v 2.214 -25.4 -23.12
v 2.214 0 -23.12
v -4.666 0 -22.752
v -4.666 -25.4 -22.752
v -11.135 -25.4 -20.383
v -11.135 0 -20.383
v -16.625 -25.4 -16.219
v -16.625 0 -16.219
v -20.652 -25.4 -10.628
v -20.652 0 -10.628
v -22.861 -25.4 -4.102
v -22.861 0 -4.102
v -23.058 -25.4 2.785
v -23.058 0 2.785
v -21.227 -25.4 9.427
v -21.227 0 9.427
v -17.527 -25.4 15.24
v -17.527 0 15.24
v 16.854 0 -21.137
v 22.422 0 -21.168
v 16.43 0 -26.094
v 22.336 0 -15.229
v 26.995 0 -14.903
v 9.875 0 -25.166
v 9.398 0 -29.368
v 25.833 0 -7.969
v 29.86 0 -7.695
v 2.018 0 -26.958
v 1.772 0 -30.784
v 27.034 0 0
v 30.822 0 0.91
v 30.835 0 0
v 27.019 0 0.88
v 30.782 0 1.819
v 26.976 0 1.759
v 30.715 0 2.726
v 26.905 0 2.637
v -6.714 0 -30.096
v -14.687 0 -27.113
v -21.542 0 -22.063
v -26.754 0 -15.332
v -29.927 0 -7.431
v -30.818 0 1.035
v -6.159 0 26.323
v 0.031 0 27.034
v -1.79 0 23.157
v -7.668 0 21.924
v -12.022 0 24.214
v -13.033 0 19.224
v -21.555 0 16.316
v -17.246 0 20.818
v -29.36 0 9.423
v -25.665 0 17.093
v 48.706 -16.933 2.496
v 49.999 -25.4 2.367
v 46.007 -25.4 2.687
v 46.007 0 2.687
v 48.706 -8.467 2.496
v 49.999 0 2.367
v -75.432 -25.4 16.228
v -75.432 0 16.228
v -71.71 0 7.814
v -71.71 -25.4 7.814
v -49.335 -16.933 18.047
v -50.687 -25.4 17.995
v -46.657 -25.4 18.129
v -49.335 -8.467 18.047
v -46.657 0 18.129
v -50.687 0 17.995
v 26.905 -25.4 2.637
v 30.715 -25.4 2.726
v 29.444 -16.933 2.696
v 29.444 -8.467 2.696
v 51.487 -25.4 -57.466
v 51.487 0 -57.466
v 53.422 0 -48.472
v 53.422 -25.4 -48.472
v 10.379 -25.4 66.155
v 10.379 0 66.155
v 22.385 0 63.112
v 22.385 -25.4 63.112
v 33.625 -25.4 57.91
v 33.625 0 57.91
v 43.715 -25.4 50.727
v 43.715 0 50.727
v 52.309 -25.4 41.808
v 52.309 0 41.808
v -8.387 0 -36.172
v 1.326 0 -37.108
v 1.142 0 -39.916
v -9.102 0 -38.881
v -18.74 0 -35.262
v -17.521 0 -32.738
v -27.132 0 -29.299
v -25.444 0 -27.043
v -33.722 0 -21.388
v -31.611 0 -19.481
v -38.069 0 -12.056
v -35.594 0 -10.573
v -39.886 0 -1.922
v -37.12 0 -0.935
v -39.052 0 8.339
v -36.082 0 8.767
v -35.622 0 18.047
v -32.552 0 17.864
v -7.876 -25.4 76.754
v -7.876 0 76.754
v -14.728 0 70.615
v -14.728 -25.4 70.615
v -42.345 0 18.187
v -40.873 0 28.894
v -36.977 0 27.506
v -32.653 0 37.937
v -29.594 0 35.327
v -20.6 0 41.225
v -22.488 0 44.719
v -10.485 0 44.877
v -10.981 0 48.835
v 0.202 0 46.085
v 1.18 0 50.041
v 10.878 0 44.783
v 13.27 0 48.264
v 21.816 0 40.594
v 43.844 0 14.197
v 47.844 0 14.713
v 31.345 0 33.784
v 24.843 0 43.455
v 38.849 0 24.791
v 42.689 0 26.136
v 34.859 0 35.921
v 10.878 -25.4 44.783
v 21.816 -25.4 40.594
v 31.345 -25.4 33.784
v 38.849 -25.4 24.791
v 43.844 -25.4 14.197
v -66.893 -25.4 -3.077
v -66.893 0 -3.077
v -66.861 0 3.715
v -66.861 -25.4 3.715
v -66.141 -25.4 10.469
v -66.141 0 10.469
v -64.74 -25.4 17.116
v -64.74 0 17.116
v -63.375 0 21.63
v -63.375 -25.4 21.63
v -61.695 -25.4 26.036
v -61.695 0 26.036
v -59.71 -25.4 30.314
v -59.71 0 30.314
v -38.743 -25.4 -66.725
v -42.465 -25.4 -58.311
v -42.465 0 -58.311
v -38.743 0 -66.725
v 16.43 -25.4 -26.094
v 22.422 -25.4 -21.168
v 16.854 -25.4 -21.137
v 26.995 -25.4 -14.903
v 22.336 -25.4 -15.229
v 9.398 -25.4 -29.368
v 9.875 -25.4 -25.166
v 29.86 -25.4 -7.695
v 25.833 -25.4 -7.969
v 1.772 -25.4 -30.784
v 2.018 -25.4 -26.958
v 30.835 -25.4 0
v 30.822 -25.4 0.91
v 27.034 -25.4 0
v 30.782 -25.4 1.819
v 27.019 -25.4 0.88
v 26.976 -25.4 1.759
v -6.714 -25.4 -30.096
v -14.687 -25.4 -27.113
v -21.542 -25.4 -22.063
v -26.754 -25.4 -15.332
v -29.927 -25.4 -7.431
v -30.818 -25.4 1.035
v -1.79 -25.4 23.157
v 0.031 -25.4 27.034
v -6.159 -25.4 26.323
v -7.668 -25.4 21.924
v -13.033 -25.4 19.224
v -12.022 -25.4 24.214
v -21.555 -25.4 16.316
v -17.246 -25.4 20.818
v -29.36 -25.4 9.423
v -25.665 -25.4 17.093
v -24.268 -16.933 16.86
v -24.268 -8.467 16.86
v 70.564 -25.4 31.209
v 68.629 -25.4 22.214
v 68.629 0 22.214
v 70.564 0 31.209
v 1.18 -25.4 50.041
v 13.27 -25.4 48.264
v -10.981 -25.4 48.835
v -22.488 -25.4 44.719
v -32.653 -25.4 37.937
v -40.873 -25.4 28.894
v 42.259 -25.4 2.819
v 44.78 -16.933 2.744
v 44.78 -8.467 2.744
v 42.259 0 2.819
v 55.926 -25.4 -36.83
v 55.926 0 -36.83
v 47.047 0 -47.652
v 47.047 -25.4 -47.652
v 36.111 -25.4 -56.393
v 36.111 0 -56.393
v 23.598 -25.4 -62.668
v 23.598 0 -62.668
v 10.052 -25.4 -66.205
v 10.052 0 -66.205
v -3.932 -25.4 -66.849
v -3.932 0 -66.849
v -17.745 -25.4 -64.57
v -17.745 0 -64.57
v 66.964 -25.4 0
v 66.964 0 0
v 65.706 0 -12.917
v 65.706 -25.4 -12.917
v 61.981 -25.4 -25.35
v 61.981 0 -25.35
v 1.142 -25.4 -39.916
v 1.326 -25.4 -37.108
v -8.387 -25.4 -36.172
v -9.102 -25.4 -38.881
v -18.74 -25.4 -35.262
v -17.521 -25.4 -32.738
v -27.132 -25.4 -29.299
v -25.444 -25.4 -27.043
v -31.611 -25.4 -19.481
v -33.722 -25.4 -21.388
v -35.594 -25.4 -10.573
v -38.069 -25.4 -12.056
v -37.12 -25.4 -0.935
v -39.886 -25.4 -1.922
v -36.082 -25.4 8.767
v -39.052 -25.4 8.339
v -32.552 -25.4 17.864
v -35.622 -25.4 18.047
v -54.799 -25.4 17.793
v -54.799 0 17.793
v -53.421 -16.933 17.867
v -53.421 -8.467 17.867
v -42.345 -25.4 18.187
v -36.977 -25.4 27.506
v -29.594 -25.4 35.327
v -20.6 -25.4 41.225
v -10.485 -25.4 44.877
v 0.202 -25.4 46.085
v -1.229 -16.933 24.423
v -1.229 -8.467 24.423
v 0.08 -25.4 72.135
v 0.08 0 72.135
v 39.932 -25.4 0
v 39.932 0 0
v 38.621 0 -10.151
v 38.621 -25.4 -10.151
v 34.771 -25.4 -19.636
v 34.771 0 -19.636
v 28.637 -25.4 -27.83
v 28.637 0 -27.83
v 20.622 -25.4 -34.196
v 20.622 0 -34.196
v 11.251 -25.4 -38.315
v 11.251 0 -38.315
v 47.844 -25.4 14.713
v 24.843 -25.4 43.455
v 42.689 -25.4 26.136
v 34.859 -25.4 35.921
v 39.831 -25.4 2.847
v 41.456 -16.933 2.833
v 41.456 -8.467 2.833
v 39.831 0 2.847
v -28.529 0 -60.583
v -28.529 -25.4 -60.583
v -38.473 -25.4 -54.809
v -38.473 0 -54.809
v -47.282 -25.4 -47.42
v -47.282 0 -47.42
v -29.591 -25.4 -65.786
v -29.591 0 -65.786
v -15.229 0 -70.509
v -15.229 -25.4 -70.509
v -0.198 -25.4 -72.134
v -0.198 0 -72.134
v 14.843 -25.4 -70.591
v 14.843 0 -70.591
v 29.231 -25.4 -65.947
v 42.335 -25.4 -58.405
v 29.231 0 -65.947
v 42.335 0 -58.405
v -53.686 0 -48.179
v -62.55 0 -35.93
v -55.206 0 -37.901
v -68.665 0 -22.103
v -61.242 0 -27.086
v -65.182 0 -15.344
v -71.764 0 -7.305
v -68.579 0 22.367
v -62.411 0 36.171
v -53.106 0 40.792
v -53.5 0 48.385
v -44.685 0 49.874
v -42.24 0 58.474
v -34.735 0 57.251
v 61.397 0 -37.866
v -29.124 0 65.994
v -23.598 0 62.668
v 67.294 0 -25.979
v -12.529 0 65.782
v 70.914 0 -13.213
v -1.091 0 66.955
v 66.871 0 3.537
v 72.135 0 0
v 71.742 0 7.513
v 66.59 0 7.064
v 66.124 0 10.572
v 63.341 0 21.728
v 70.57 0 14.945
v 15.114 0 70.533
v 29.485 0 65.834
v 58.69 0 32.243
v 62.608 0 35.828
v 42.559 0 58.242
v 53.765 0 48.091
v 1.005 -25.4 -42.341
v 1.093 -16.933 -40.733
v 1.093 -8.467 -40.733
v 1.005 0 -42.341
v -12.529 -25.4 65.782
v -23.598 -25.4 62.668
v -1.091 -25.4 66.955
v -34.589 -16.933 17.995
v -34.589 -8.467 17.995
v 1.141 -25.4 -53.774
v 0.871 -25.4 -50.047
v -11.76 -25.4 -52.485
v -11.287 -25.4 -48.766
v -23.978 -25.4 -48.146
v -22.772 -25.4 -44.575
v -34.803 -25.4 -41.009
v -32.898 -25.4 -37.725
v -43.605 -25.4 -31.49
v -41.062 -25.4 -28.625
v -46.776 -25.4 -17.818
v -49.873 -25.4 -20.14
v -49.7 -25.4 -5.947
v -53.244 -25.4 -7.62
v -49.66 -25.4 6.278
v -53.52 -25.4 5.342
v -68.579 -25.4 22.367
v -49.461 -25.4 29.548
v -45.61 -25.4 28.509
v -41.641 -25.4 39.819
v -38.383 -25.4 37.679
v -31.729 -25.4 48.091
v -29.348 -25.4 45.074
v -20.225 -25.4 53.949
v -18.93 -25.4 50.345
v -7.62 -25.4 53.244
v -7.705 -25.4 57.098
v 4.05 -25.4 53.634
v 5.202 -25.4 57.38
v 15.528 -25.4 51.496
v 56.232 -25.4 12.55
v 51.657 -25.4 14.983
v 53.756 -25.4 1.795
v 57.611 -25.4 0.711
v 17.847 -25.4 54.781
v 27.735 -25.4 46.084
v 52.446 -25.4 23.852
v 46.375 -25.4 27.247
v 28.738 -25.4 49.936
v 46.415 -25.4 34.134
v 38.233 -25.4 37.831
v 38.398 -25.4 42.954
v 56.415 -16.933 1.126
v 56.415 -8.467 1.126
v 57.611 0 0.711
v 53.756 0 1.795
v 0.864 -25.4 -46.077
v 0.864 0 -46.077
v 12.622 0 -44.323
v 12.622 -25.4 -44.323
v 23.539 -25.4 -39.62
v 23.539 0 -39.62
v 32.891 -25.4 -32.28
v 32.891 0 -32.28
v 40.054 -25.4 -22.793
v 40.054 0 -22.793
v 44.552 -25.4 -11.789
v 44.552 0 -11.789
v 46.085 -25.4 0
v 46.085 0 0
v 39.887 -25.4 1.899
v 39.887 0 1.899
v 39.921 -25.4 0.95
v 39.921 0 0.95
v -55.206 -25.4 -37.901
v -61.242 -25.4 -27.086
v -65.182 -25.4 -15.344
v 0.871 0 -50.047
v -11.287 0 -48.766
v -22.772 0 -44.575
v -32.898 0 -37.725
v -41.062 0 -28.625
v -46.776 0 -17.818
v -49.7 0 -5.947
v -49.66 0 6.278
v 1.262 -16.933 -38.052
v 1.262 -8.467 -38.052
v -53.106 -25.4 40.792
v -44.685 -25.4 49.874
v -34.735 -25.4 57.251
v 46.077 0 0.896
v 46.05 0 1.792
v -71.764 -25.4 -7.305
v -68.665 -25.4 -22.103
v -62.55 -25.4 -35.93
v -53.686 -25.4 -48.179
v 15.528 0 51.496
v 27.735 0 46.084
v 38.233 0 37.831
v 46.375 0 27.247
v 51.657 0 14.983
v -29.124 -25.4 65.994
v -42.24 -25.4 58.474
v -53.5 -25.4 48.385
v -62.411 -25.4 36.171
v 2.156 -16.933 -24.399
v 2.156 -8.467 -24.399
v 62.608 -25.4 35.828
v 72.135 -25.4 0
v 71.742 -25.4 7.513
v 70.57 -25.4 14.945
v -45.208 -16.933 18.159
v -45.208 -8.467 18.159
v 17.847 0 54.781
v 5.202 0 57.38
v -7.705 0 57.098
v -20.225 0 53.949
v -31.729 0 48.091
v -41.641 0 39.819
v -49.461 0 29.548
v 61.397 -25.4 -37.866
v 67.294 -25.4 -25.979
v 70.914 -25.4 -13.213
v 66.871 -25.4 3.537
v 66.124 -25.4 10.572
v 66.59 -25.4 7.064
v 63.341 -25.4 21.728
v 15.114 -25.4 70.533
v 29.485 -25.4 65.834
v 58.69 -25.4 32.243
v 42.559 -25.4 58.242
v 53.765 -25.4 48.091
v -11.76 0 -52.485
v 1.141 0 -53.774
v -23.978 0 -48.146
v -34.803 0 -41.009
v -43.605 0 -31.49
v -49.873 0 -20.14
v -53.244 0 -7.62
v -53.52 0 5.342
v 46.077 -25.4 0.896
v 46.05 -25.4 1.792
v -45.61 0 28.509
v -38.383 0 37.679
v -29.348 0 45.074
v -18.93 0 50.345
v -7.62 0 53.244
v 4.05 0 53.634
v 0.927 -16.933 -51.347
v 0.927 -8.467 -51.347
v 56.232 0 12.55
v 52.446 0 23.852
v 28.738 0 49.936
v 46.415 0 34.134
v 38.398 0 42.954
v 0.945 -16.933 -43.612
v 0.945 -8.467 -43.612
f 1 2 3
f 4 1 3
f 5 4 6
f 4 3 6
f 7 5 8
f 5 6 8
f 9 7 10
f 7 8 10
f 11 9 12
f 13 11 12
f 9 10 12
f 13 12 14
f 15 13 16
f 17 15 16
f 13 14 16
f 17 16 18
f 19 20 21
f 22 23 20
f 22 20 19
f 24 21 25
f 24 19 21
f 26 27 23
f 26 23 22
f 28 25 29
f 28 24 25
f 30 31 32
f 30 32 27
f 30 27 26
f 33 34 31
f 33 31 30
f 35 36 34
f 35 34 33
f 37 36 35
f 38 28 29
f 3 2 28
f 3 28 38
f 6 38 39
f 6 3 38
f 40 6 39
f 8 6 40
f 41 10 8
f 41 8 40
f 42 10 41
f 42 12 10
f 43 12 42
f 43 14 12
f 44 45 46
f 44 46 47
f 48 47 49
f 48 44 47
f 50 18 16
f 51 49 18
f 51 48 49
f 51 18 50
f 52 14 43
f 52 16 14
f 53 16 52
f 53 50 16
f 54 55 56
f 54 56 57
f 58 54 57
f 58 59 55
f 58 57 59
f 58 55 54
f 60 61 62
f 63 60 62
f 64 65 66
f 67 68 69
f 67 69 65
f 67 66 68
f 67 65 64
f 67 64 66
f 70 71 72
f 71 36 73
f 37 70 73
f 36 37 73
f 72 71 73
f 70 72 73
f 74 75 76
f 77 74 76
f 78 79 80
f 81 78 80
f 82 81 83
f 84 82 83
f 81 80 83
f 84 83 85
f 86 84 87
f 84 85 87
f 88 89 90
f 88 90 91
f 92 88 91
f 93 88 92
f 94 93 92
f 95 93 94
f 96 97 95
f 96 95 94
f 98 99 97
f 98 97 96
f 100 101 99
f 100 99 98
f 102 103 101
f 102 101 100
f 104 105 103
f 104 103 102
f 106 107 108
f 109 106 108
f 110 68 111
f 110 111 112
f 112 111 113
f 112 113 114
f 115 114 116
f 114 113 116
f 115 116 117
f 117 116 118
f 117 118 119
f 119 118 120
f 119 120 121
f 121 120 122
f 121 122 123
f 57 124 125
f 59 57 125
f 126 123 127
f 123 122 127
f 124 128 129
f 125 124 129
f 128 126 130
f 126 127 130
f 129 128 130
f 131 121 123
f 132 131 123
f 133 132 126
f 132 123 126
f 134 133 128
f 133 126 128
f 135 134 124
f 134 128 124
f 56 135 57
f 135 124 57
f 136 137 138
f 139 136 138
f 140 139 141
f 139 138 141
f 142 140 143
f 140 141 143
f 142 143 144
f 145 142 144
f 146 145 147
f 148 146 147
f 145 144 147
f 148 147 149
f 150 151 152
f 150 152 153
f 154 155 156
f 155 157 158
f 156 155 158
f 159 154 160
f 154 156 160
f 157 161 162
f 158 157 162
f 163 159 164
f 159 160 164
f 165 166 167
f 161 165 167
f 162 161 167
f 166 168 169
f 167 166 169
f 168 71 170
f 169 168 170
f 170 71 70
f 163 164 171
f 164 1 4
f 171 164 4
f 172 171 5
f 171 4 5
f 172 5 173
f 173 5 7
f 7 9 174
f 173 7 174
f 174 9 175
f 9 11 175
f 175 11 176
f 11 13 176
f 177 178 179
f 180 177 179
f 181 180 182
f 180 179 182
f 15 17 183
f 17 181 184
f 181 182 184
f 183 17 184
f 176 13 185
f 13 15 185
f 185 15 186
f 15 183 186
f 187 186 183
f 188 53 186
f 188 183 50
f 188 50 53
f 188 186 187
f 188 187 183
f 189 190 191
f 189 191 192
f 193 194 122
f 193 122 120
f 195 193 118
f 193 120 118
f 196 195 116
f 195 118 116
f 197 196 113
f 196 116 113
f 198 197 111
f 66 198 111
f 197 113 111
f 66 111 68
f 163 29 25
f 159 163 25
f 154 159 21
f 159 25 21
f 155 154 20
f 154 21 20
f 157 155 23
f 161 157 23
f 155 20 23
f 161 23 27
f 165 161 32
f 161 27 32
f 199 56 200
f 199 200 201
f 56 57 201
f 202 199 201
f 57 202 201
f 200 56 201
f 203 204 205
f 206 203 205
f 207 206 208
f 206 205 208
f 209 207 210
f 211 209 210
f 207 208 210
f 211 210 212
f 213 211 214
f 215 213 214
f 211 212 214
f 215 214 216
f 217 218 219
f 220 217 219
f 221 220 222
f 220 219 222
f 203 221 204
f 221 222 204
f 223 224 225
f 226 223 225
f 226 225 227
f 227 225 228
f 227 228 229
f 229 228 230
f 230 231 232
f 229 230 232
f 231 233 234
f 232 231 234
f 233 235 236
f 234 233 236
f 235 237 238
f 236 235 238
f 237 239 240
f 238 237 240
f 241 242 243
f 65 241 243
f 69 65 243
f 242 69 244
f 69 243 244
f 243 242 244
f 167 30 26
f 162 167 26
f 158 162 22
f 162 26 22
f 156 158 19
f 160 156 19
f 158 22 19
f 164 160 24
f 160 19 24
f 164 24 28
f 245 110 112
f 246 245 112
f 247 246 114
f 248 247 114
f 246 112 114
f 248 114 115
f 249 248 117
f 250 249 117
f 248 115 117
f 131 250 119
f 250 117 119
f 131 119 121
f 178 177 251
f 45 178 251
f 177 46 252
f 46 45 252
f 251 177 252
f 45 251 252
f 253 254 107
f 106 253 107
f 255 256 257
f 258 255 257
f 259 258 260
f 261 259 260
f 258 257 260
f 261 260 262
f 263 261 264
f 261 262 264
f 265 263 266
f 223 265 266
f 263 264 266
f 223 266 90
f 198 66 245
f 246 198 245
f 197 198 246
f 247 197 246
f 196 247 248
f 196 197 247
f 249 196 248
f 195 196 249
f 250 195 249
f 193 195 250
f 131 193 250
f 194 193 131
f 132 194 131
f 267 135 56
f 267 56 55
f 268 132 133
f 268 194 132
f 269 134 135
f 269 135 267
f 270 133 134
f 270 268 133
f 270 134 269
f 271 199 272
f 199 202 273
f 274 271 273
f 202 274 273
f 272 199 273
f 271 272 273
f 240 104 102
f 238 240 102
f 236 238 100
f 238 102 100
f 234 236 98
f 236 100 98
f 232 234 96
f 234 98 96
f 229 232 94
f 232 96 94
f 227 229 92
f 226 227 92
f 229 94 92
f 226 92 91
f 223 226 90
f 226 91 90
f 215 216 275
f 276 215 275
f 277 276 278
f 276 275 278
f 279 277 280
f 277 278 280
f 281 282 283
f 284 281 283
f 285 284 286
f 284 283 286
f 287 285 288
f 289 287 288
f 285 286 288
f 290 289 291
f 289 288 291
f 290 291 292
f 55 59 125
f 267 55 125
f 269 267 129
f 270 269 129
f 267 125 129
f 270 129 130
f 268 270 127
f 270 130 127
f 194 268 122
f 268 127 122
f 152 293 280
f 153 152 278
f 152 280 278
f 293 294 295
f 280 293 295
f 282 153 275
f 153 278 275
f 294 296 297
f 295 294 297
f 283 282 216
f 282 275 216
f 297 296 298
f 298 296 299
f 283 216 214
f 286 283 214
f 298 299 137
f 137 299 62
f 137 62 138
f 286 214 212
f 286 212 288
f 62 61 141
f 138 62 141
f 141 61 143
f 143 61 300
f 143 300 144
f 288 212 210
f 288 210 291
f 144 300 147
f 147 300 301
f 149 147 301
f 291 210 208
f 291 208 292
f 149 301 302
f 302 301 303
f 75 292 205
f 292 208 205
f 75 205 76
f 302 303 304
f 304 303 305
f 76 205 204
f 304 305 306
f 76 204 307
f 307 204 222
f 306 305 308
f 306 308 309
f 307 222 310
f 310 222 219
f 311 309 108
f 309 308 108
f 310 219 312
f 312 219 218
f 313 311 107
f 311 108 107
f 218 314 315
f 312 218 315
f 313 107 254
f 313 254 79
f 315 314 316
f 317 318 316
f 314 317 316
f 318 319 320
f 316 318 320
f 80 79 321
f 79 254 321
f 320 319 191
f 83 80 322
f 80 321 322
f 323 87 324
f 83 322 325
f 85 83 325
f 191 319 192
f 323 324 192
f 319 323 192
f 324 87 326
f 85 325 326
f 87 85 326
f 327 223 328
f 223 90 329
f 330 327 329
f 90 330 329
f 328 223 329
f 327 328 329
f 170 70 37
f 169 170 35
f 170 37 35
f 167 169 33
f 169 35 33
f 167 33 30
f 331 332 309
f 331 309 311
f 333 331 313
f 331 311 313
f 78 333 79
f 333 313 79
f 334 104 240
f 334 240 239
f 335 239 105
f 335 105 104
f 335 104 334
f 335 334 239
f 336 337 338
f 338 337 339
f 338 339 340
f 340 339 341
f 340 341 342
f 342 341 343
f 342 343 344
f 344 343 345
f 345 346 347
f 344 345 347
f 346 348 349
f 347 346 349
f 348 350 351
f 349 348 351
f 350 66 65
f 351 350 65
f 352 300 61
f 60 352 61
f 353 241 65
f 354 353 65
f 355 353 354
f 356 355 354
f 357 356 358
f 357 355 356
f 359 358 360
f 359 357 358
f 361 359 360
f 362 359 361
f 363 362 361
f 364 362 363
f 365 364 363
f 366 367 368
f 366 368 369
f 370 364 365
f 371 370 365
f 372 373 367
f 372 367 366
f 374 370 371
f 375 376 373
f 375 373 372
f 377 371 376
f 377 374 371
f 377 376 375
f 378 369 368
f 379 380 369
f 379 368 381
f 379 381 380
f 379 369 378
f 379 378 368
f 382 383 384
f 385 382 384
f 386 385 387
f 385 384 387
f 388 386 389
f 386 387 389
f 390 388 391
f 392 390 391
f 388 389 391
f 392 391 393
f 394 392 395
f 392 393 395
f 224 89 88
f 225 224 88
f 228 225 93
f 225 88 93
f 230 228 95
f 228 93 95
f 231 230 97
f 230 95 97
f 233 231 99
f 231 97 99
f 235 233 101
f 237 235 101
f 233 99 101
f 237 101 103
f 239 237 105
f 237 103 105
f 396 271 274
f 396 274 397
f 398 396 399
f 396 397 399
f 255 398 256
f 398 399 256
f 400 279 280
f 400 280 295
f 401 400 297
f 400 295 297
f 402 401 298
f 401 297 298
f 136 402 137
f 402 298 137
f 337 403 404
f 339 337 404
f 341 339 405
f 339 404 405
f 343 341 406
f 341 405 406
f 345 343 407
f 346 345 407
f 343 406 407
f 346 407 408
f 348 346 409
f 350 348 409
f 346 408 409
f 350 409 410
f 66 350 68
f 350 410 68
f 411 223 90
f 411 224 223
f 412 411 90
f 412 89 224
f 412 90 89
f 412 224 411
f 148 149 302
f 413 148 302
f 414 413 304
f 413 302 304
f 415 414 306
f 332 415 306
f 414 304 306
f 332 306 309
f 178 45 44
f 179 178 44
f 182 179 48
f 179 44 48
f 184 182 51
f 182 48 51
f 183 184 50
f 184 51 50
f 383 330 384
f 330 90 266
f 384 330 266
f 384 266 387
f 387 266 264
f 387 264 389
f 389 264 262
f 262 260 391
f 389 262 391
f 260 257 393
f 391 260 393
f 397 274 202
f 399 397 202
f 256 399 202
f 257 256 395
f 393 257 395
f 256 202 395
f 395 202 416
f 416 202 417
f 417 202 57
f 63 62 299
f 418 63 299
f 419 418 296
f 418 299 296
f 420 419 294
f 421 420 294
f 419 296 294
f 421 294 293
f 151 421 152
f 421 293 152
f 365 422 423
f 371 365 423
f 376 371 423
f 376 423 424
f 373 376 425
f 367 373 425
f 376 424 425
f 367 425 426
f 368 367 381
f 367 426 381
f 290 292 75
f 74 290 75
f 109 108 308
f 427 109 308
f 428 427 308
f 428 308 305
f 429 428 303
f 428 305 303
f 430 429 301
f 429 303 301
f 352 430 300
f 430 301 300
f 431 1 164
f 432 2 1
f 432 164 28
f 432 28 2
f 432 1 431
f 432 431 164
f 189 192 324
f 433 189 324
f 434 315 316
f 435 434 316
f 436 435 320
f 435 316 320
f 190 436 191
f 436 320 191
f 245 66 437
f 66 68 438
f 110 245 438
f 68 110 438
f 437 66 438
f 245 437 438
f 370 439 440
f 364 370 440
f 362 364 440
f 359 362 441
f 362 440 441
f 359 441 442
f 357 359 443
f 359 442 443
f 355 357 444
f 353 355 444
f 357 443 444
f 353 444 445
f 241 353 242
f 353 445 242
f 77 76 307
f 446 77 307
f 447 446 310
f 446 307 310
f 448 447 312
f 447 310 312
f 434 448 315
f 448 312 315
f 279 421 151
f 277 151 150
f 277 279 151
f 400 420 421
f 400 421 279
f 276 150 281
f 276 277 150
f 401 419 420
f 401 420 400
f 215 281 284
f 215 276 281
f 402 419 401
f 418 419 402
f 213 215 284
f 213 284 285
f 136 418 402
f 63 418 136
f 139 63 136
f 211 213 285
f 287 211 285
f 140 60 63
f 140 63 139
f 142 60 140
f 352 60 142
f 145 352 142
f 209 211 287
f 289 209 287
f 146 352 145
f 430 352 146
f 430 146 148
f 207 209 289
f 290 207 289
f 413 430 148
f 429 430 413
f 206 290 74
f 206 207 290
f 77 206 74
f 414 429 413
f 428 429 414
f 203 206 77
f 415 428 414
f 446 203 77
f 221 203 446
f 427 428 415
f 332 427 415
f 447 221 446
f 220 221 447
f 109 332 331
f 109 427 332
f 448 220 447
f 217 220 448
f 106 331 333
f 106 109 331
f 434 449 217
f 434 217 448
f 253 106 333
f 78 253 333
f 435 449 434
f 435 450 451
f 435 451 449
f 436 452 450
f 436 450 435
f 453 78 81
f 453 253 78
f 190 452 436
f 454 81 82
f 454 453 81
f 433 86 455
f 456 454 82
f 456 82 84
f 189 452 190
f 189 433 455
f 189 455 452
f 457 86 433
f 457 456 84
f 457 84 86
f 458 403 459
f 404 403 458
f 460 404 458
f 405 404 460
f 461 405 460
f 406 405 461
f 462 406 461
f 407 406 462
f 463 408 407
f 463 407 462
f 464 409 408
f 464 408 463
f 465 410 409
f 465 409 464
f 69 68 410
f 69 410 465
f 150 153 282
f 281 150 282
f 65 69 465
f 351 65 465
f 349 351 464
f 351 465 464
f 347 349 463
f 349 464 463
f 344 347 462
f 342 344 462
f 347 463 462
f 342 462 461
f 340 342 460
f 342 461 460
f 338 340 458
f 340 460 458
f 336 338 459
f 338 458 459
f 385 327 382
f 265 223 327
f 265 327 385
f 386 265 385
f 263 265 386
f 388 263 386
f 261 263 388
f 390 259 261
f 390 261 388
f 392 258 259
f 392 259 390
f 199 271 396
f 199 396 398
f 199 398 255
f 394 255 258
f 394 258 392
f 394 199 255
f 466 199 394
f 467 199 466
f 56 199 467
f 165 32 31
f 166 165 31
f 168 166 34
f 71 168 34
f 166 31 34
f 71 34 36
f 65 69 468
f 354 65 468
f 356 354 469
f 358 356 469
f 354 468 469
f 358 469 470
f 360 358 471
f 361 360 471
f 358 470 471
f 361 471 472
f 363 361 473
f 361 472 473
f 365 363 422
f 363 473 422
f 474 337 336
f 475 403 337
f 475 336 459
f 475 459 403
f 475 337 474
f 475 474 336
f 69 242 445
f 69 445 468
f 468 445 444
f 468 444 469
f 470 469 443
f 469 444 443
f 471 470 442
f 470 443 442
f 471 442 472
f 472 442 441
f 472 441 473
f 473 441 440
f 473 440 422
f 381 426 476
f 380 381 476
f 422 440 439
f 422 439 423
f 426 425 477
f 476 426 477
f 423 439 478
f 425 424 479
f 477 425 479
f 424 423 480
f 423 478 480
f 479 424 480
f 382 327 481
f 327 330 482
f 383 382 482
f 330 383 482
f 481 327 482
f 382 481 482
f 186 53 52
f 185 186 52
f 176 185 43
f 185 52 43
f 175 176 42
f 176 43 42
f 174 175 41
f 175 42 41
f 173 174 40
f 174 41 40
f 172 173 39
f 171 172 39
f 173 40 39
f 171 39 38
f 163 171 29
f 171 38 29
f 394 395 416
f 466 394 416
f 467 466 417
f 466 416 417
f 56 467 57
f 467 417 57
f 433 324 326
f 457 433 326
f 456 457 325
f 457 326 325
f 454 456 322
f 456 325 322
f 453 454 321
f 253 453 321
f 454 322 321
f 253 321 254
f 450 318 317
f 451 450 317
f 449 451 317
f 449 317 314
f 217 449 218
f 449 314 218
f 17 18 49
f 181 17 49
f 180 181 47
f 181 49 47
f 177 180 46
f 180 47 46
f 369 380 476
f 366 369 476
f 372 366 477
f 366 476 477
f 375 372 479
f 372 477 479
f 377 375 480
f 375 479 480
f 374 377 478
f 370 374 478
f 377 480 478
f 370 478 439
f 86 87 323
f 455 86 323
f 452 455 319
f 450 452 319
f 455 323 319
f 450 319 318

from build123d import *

# Parameters (mm, degrees)
F1_DEPTH = 25.4


with BuildPart() as f1:
    # F0 (on Front) → F1 (new body)
    with BuildSketch(Plane.XZ):
        with BuildLine():
            Line((0.0804563043, 72.1346472531), (-7.8757622136, 76.7543875159))
            Line((-7.8757622136, 76.7543875159), (-14.7280030271, 70.6151523001))
            ThreePointArc((-14.7280030271, 70.6151523001), (-7.3630749336, 71.7579189711), (0.0804563043, 72.1346472531))
        make_face()
        with BuildLine():
            ThreePointArc((62.6077975156, 35.8284453721), (36.2213937543, 62.3812827861), (0.0804563043, 72.1346472531))
            Line((0.0804563043, 72.1346472531), (10.379058307, 66.1548132131))
            ThreePointArc((10.379058307, 66.1548132131), (33.6250311343, 57.9097698478), (52.3091955129, 41.808279412))
            Line((52.3091955129, 41.808279412), (62.6077975156, 35.8284453721))
        make_face()
        with BuildLine():
            Line((10.379058307, 66.1548132131), (0.0804563043, 72.1346472531))
            ThreePointArc((0.0804563043, 72.1346472531), (-7.3630749336, 71.7579189711), (-14.7280030271, 70.6151523001))
            Line((-14.7280030271, 70.6151523001), (-23.5976061943, 62.6684700986))
            ThreePointArc((-23.5976061943, 62.6684700986), (-6.8352870562, 66.6142853558), (10.379058307, 66.1548132131))
        make_face()
        with BuildLine():
            Line((-23.5976061943, 62.6684700986), (-14.7280030271, 70.6151523001))
            ThreePointArc((-14.7280030271, 70.6151523001), (-48.1350992585, 53.7254690711), (-68.5792639553, 22.3673503769))
            Line((-68.5792639553, 22.3673503769), (-59.7096607881, 30.3140325785))
            ThreePointArc((-59.7096607881, 30.3140325785), (-44.684757914, 49.8744079942), (-23.5976061943, 62.6684700986))
        make_face()
        with BuildLine():
            ThreePointArc((68.628988686, 22.214313392), (65.9705211479, 29.1771168386), (62.6077975156, 35.8284453721))
            Line((62.6077975156, 35.8284453721), (52.3091955129, 41.808279412))
            ThreePointArc((52.3091955129, 41.808279412), (61.2417303042, 27.0856905386), (66.1242715931, 10.5718905067))
            Line((66.1242715931, 10.5718905067), (68.628988686, 22.214313392))
        make_face()
        with BuildLine():
            Line((70.5640160335, 31.2087051093), (62.6077975156, 35.8284453721))
            ThreePointArc((62.6077975156, 35.8284453721), (65.9705211479, 29.1771168386), (68.628988686, 22.214313392))
            Line((68.628988686, 22.214313392), (70.5640160335, 31.2087051093))
        make_face()
        with BuildLine():
            ThreePointArc((-70.1811130337, 16.6740871082), (-69.4385618169, 19.5371425839), (-68.5792639553, 22.3673503769))
            Line((-68.5792639553, 22.3673503769), (-75.4315047689, 16.2281151612))
            add(Edge.make_bspline(
                [(-75.4315047689, 16.2281151612), (-73.6801810781, 16.3779407802), (-71.9288512089, 16.5277670762), (-70.1811130337, 16.6740871082)],
                knots=[0, 0, 0, 0, 0.0110848613, 0.0110848613, 0.0110848613, 0.0110848613], degree=3))
        make_face()
        with BuildLine():
            Line((-59.7096607881, 30.3140325785), (-68.5792639553, 22.3673503769))
            ThreePointArc((-68.5792639553, 22.3673503769), (-69.4385618169, 19.5371425839), (-70.1811130337, 16.6740871082))
            add(Edge.make_bspline(
                [(-70.1811130337, 16.6740871082), (-68.362095804, 16.8263745979), (-66.5469692067, 16.9748639956), (-64.7397895139, 17.1156015464)],
                knots=[0.0110848613, 0.0110848613, 0.0110848613, 0.0110848613, 0.0226218032, 0.0226218032, 0.0226218032, 0.0226218032], degree=3))
            ThreePointArc((-64.7397895139, 17.1156015464), (-62.5736850885, 23.8478111585), (-59.7096607881, 30.3140325785))
        make_face()
        with BuildLine():
            ThreePointArc((72.134692122, 0), (71.2528763526, 11.2446173352), (68.628988686, 22.214313392))
            Line((68.628988686, 22.214313392), (66.1242715931, 10.5718905067))
            ThreePointArc((66.1242715931, 10.5718905067), (66.7537762071, 5.3025960338), (66.9640512708, 0))
            ThreePointArc((66.9640512708, 0), (64.145330939, -19.223961125), (55.9264669455, -36.8295324108))
            Line((55.9264669455, -36.8295324108), (53.4217498526, -48.4719552961))
            ThreePointArc((53.4217498526, -48.4719552961), (67.2940386876, -25.9793411127), (72.134692122, 0))
        make_face()
        with BuildLine():
            add(Edge.make_bspline(
                [(-75.4315047689, 16.2281151612), (-73.6801810781, 16.3779407802), (-71.9288512089, 16.5277670762), (-70.1811130337, 16.6740871082)],
                knots=[0, 0, 0, 0, 0.0110848613, 0.0110848613, 0.0110848613, 0.0110848613], degree=3))
            Line((-75.4315047689, 16.2281151612), (-71.7102039728, 7.8141188702))
            ThreePointArc((-71.7102039728, 7.8141188702), (-71.0838323373, 12.2679496162), (-70.1811130337, 16.6740871082))
        make_face()
        with BuildLine():
            add(Edge.make_bspline(
                [(-70.1811130337, 16.6740871082), (-68.362095804, 16.8263745979), (-66.5469692067, 16.9748639956), (-64.7397895139, 17.1156015464)],
                knots=[0.0110848613, 0.0110848613, 0.0110848613, 0.0110848613, 0.0226218032, 0.0226218032, 0.0226218032, 0.0226218032], degree=3))
            ThreePointArc((-70.1811130337, 16.6740871082), (-71.0838323373, 12.2679496162), (-71.7102039728, 7.8141188702))
            Line((-71.7102039728, 7.8141188702), (-66.8933181941, -3.0770348681))
            ThreePointArc((-66.8933181941, -3.0770348681), (-66.5864430839, 7.1013914157), (-64.7397895139, 17.1156015464))
        make_face()
        with BuildLine():
            Line((-66.8933181941, -3.0770348681), (-71.7102039728, 7.8141188702))
            ThreePointArc((-71.7102039728, 7.8141188702), (-65.9705211479, -29.1771168386), (-42.4647723522, -58.3108644818))
            Line((-42.4647723522, -58.3108644818), (-47.2816581308, -47.4197107436))
            ThreePointArc((-47.2816581308, -47.4197107436), (-61.2417303042, -27.0856905386), (-66.8933181941, -3.0770348681))
        make_face()
        with BuildLine():
            ThreePointArc((42.3345913172, -58.4054465401), (48.1350992585, -53.7254690711), (53.4217498526, -48.4719552961))
            Line((53.4217498526, -48.4719552961), (55.9264669455, -36.8295324108))
            ThreePointArc((55.9264669455, -36.8295324108), (44.684757914, -49.8744079942), (30.4879890188, -59.6210255547))
            Line((30.4879890188, -59.6210255547), (42.3345913172, -58.4054465401))
        make_face()
        with BuildLine():
            Line((51.486722505, -57.4663470135), (53.4217498526, -48.4719552961))
            ThreePointArc((53.4217498526, -48.4719552961), (48.1350992585, -53.7254690711), (42.3345913172, -58.4054465401))
            Line((42.3345913172, -58.4054465401), (51.486722505, -57.4663470135))
        make_face()
        with BuildLine():
            ThreePointArc((-29.5913403683, -65.7857612463), (-36.2213937543, -62.3812827861), (-42.4647723522, -58.3108644818))
            Line((-42.4647723522, -58.3108644818), (-38.7434715561, -66.7248607729))
            Line((-38.7434715561, -66.7248607729), (-29.5913403683, -65.7857612463))
        make_face()
        with BuildLine():
            Line((-47.2816581308, -47.4197107436), (-42.4647723522, -58.3108644818))
            ThreePointArc((-42.4647723522, -58.3108644818), (-36.2213937543, -62.3812827861), (-29.5913403683, -65.7857612463))
            Line((-29.5913403683, -65.7857612463), (-17.7447380699, -64.5701822317))
            ThreePointArc((-17.7447380699, -64.5701822317), (-33.6250311343, -57.9097698478), (-47.2816581308, -47.4197107436))
        make_face()
        with BuildLine():
            ThreePointArc((-29.5913403683, -65.7857612463), (7.3630749336, -71.7579189711), (42.3345913172, -58.4054465401))
            Line((42.3345913172, -58.4054465401), (30.4879890188, -59.6210255547))
            ThreePointArc((30.4879890188, -59.6210255547), (6.8352870562, -66.6142853558), (-17.7447380699, -64.5701822317))
            Line((-17.7447380699, -64.5701822317), (-29.5913403683, -65.7857612463))
        make_face()
    extrude(amount=F1_DEPTH)


with BuildPart() as f1b:
    # F0 (on Front) → F1, piece 2 (new body)
    with BuildSketch(Plane.XZ):
        with BuildLine():
            ThreePointArc((17.8474131482, 54.7811527956), (-26.1415508125, 51.3431999277), (-54.7988191164, 17.7930964463))
            add(Edge.make_bspline(
                [(-54.7988191164, 17.7930964463), (-53.4180734669, 17.8701419739), (-52.0468052053, 17.9379460939), (-50.6869602761, 17.9946120432)],
                knots=[0.0440052643, 0.0440052643, 0.0440052643, 0.0440052643, 0.0530367351, 0.0530367351, 0.0530367351, 0.0530367351], degree=3))
            ThreePointArc((-50.6869602761, 17.9946120432), (-24.2822021716, 47.9932147528), (15.5280586181, 51.4961493722))
            add(Edge.make_bspline(
                [(15.5280586181, 51.4961493722), (16.2953998908, 52.5878890346), (17.0695301608, 53.6834646207), (17.8474131482, 54.7811527956)],
                knots=[0.9806259826, 0.9806259826, 0.9806259826, 0.9806259826, 0.9892751554, 0.9892751554, 0.9892751554, 0.9892751554], degree=3))
        make_face()
        with BuildLine():
            add(Edge.make_bspline(
                [(57.6107607755, 0.7107042783), (56.462742198, 1.1538709295), (55.1691307112, 1.5102558583), (53.7564053874, 1.7952393804)],
                knots=[0.6553417422, 0.6553417422, 0.6553417422, 0.6553417422, 0.6691124751, 0.6691124751, 0.6691124751, 0.6691124751], degree=3))
            ThreePointArc((57.6107607755, 0.7107042783), (46.4153784181, 34.1338176009), (17.8474131482, 54.7811527956))
            add(Edge.make_bspline(
                [(15.5280586181, 51.4961493722), (16.2953998908, 52.5878890346), (17.0695301608, 53.6834646207), (17.8474131482, 54.7811527956)],
                knots=[0.9806259826, 0.9806259826, 0.9806259826, 0.9806259826, 0.9892751554, 0.9892751554, 0.9892751554, 0.9892751554], degree=3))
            ThreePointArc((15.5280586181, 51.4961493722), (42.6336645345, 32.7924481089), (53.7564053874, 1.7952393804))
        make_face()
    extrude(amount=F1_DEPTH)


with BuildPart() as f1c:
    # F0 (on Front) → F1, piece 3 (new body)
    with BuildSketch(Plane.XZ):
        with BuildLine():
            add(Edge.make_bspline(
                [(-50.6869602761, 17.9946120432), (-49.3314822975, 18.0510960178), (-47.9873544002, 18.0965132441), (-46.6565038412, 18.1289851741)],
                knots=[0.0530367351, 0.0530367351, 0.0530367351, 0.0530367351, 0.0620392027, 0.0620392027, 0.0620392027, 0.0620392027], degree=3))
            ThreePointArc((-50.6869602761, 17.9946120432), (-43.604859977, -31.4895250996), (1.141385438, -53.7742619093))
            add(Edge.make_bspline(
                [(0.8706699494, -50.0472915148), (0.9119172038, -51.3735505285), (0.9980162573, -52.6210201223), (1.141385438, -53.7742619093)],
                knots=[0.3429048112, 0.3429048112, 0.3429048112, 0.3429048112, 0.3552562401, 0.3552562401, 0.3552562401, 0.3552562401], degree=3))
            ThreePointArc((0.8706699494, -50.0472915148), (-41.0619875564, -28.6252097293), (-46.6565038412, 18.1289851741))
        make_face()
    extrude(amount=F1_DEPTH)


with BuildPart() as f1d:
    # F0 (on Front) → F1, piece 4 (new body)
    with BuildSketch(Plane.XZ):
        with BuildLine():
            ThreePointArc((13.2700106945, 48.2638194748), (-22.4875863699, 44.7191000959), (-46.6565038412, 18.1289851741))
            add(Edge.make_bspline(
                [(-46.6565038412, 18.1289851741), (-45.202639449, 18.1644585655), (-43.7646203485, 18.1844829268), (-42.3449591404, 18.1866091603)],
                knots=[0.0620392027, 0.0620392027, 0.0620392027, 0.0620392027, 0.0718737908, 0.0718737908, 0.0718737908, 0.0718737908], degree=3))
            ThreePointArc((-42.3449591404, 18.1866091603), (-20.6004330804, 41.2246343132), (10.878347446, 44.782919447))
            add(Edge.make_bspline(
                [(10.878347446, 44.782919447), (11.6616317718, 45.9353294378), (12.4601226636, 47.0963501665), (13.2700106945, 48.2638194748)],
                knots=[0.9627272628, 0.9627272628, 0.9627272628, 0.9627272628, 0.9720558065, 0.9720558065, 0.9720558065, 0.9720558065], degree=3))
        make_face()
        with BuildLine():
            add(Edge.make_bspline(
                [(49.9988649095, 2.3670576439), (48.7257298476, 2.5084241824), (47.3905488256, 2.6123363012), (46.0068497112, 2.6866516352)],
                knots=[0.6805676145, 0.6805676145, 0.6805676145, 0.6805676145, 0.6915762269, 0.6915762269, 0.6915762269, 0.6915762269], degree=3))
            ThreePointArc((49.9988649095, 2.3670576439), (39.0815281391, 31.2749678248), (13.2700106945, 48.2638194748))
            add(Edge.make_bspline(
                [(10.878347446, 44.782919447), (11.6616317718, 45.9353294378), (12.4601226636, 47.0963501665), (13.2700106945, 48.2638194748)],
                knots=[0.9627272628, 0.9627272628, 0.9627272628, 0.9627272628, 0.9720558065, 0.9720558065, 0.9720558065, 0.9720558065], degree=3))
            ThreePointArc((10.878347446, 44.782919447), (35.3836876939, 29.5269870209), (46.0068497112, 2.6866516352))
        make_face()
    extrude(amount=F1_DEPTH)


with BuildPart() as f1e:
    # F0 (on Front) → F1, piece 5 (new body)
    with BuildSketch(Plane.XZ):
        with BuildLine():
            ThreePointArc((46.0852288413, 0), (46.0656298913, 1.3438973451), (46.0068497112, 2.6866516352))
            add(Edge.make_bspline(
                [(46.0068497112, 2.6866516352), (44.7919040289, 2.751903606), (43.5395529627, 2.7943377156), (42.2589539711, 2.8192730553)],
                knots=[0.6915762269, 0.6915762269, 0.6915762269, 0.6915762269, 0.701242249, 0.701242249, 0.701242249, 0.701242249], degree=3))
            ThreePointArc((42.2589539711, 2.8192730553), (42.3294012483, 1.4104188191), (42.3528923604, 0))
            ThreePointArc((42.3528923604, 0), (30.301180763, -29.5906393249), (1.0047866298, -42.3409718254))
            add(Edge.make_bspline(
                [(1.0047866298, -42.3409718254), (0.9399173868, -43.6241751634), (0.8905666488, -44.8724435644), (0.8636859405, -46.0771349364)],
                knots=[0.3210190464, 0.3210190464, 0.3210190464, 0.3210190464, 0.3311984622, 0.3311984622, 0.3311984622, 0.3311984622], degree=3))
            ThreePointArc((0.8636859405, -46.0771349364), (32.8911194821, -32.28037448), (46.0852288413, 0))
        make_face()
        with BuildLine():
            ThreePointArc((42.3528923604, 0), (42.3294012483, 1.4104188191), (42.2589539711, 2.8192730553))
            add(Edge.make_bspline(
                [(42.2589539711, 2.8192730553), (41.4598523848, 2.8348328594), (40.6497515192, 2.8435789292), (39.8308764327, 2.8468036855)],
                knots=[0.701242249, 0.701242249, 0.701242249, 0.701242249, 0.7072739057, 0.7072739057, 0.7072739057, 0.7072739057], degree=3))
            ThreePointArc((39.8308764327, 2.8468036855), (39.9070714907, 1.4243081333), (39.9324806219, 0))
            ThreePointArc((39.9324806219, 0), (28.637325364, -27.8299587605), (1.1416721096, -39.9161570472))
            add(Edge.make_bspline(
                [(1.1416721096, -39.9161570472), (1.0911833961, -40.7364829506), (1.0450027701, -41.5454409513), (1.0047866298, -42.3409718254)],
                knots=[0.3147082465, 0.3147082465, 0.3147082465, 0.3147082465, 0.3210190464, 0.3210190464, 0.3210190464, 0.3210190464], degree=3))
            ThreePointArc((1.0047866298, -42.3409718254), (30.301180763, -29.5906393249), (42.3528923604, 0))
        make_face()
    extrude(amount=F1_DEPTH)


with BuildPart() as f1f:
    # F0 (on Front) → F1, piece 6 (new body)
    with BuildSketch(Plane.XZ):
        with BuildLine():
            add(Edge.make_bspline(
                [(-35.621951687, 18.0465943222), (-34.5850294785, 17.9990600754), (-33.5612567748, 17.9387061923), (-32.5517625301, 17.8644322516)],
                knots=[0.087754174, 0.087754174, 0.087754174, 0.087754174, 0.0952866965, 0.0952866965, 0.0952866965, 0.0952866965], degree=3))
            ThreePointArc((-35.621951687, 18.0465943222), (-33.7215443969, -21.3883251357), (1.1416721096, -39.9161570472))
            add(Edge.make_bspline(
                [(1.326030323, -37.1079078778), (1.26069871, -38.0564191035), (1.1984603116, -38.9934788882), (1.1416721096, -39.9161570472)],
                knots=[0.3076100467, 0.3076100467, 0.3076100467, 0.3076100467, 0.3147082465, 0.3147082465, 0.3147082465, 0.3147082465], degree=3))
            ThreePointArc((1.326030323, -37.1079078778), (-31.6109337539, -19.480863705), (-32.5517625301, 17.8644322516))
        make_face()
    extrude(amount=F1_DEPTH)


with BuildPart() as f1g:
    # F0 (on Front) → F1, piece 7 (new body)
    with BuildSketch(Plane.XZ):
        with BuildLine():
            add(Edge.make_bspline(
                [(-25.6645379323, 17.0925479942), (-24.2548098485, 16.8725866776), (-22.8835176436, 16.6151552991), (-21.5545197047, 16.3164929872)],
                knots=[0.1130457972, 0.1130457972, 0.1130457972, 0.1130457972, 0.1243919933, 0.1243919933, 0.1243919933, 0.1243919933], degree=3))
            ThreePointArc((-25.6645379323, 17.0925479942), (-26.75376959, -15.3316508223), (1.7721063726, -30.7844659401))
            add(Edge.make_bspline(
                [(2.0184674831, -26.9583206473), (1.9430941028, -28.2379532102), (1.8592908583, -29.5154271132), (1.7721063726, -30.7844659401)],
                knots=[0.2830165775, 0.2830165775, 0.2830165775, 0.2830165775, 0.2921665644, 0.2921665644, 0.2921665644, 0.2921665644], degree=3))
            ThreePointArc((2.0184674831, -26.9583206473), (-23.7400865179, -12.9318813491), (-21.5545197047, 16.3164929872))
        make_face()
        with BuildLine():
            ThreePointArc((30.8354293664, 0), (30.8052215855, 1.3645612049), (30.7146574284, 2.726448838))
            add(Edge.make_bspline(
                [(30.7146574284, 2.726448838), (29.4439156689, 2.6969565272), (28.1715468265, 2.6655768286), (26.9049012864, 2.6365791987)],
                knots=[0.7290704359, 0.7290704359, 0.7290704359, 0.7290704359, 0.7380535345, 0.7380535345, 0.7380535345, 0.7380535345], degree=3))
            ThreePointArc((26.9049012864, 2.6365791987), (27.0015411264, 1.3198635918), (27.0337800372, 0))
            ThreePointArc((27.0337800372, 0), (19.8165596037, -18.3882905289), (2.0184674831, -26.9583206473))
            add(Edge.make_bspline(
                [(2.0184674831, -26.9583206473), (1.9430941028, -28.2379532102), (1.8592908583, -29.5154271132), (1.7721063726, -30.7844659401)],
                knots=[0.2830165775, 0.2830165775, 0.2830165775, 0.2830165775, 0.2921665644, 0.2921665644, 0.2921665644, 0.2921665644], degree=3))
            ThreePointArc((1.7721063726, -30.7844659401), (22.4217234517, -21.1681369436), (30.8354293664, 0))
        make_face()
        with BuildLine():
            ThreePointArc((0.0308885054, 27.0337623908), (-12.0221312947, 24.2135008257), (-21.5545197047, 16.3164929872))
            add(Edge.make_bspline(
                [(-21.5545197047, 16.3164929872), (-20.1643054515, 16.0040736894), (-18.8203715182, 15.6465376189), (-17.5271344034, 15.2395798985)],
                knots=[0.1243919933, 0.1243919933, 0.1243919933, 0.1243919933, 0.136260818, 0.136260818, 0.136260818, 0.136260818], degree=3))
            ThreePointArc((-17.5271344034, 15.2395798985), (-10.4381626353, 20.7482528584), (-1.7896155874, 23.1569106732))
            add(Edge.make_bspline(
                [(-1.7896155874, 23.1569106732), (-1.2533807016, 24.4091596989), (-0.6435000896, 25.7031724079), (0.0308885054, 27.0337623908)],
                knots=[0.8993224909, 0.8993224909, 0.8993224909, 0.8993224909, 0.9118099368, 0.9118099368, 0.9118099368, 0.9118099368], degree=3))
        make_face()
        with BuildLine():
            add(Edge.make_bspline(
                [(-21.5545197047, 16.3164929872), (-20.1643054515, 16.0040736894), (-18.8203715182, 15.6465376189), (-17.5271344034, 15.2395798985)],
                knots=[0.1243919933, 0.1243919933, 0.1243919933, 0.1243919933, 0.136260818, 0.136260818, 0.136260818, 0.136260818], degree=3))
            ThreePointArc((-21.5545197047, 16.3164929872), (-23.7400865179, -12.9318813491), (2.0184674831, -26.9583206473))
            add(Edge.make_bspline(
                [(2.214209568, -23.120175429), (2.1607511248, -24.3975335956), (2.0938221425, -25.6790059153), (2.0184674831, -26.9583206473)],
                knots=[0.2738688632, 0.2738688632, 0.2738688632, 0.2738688632, 0.2830165775, 0.2830165775, 0.2830165775, 0.2830165775], degree=3))
            ThreePointArc((2.214209568, -23.120175429), (-20.6516131077, -10.628081291), (-17.5271344034, 15.2395798985))
        make_face()
    extrude(amount=F1_DEPTH)


solid = Compound([f1.part, f1b.part, f1c.part, f1d.part, f1e.part, f1f.part, f1g.part])
